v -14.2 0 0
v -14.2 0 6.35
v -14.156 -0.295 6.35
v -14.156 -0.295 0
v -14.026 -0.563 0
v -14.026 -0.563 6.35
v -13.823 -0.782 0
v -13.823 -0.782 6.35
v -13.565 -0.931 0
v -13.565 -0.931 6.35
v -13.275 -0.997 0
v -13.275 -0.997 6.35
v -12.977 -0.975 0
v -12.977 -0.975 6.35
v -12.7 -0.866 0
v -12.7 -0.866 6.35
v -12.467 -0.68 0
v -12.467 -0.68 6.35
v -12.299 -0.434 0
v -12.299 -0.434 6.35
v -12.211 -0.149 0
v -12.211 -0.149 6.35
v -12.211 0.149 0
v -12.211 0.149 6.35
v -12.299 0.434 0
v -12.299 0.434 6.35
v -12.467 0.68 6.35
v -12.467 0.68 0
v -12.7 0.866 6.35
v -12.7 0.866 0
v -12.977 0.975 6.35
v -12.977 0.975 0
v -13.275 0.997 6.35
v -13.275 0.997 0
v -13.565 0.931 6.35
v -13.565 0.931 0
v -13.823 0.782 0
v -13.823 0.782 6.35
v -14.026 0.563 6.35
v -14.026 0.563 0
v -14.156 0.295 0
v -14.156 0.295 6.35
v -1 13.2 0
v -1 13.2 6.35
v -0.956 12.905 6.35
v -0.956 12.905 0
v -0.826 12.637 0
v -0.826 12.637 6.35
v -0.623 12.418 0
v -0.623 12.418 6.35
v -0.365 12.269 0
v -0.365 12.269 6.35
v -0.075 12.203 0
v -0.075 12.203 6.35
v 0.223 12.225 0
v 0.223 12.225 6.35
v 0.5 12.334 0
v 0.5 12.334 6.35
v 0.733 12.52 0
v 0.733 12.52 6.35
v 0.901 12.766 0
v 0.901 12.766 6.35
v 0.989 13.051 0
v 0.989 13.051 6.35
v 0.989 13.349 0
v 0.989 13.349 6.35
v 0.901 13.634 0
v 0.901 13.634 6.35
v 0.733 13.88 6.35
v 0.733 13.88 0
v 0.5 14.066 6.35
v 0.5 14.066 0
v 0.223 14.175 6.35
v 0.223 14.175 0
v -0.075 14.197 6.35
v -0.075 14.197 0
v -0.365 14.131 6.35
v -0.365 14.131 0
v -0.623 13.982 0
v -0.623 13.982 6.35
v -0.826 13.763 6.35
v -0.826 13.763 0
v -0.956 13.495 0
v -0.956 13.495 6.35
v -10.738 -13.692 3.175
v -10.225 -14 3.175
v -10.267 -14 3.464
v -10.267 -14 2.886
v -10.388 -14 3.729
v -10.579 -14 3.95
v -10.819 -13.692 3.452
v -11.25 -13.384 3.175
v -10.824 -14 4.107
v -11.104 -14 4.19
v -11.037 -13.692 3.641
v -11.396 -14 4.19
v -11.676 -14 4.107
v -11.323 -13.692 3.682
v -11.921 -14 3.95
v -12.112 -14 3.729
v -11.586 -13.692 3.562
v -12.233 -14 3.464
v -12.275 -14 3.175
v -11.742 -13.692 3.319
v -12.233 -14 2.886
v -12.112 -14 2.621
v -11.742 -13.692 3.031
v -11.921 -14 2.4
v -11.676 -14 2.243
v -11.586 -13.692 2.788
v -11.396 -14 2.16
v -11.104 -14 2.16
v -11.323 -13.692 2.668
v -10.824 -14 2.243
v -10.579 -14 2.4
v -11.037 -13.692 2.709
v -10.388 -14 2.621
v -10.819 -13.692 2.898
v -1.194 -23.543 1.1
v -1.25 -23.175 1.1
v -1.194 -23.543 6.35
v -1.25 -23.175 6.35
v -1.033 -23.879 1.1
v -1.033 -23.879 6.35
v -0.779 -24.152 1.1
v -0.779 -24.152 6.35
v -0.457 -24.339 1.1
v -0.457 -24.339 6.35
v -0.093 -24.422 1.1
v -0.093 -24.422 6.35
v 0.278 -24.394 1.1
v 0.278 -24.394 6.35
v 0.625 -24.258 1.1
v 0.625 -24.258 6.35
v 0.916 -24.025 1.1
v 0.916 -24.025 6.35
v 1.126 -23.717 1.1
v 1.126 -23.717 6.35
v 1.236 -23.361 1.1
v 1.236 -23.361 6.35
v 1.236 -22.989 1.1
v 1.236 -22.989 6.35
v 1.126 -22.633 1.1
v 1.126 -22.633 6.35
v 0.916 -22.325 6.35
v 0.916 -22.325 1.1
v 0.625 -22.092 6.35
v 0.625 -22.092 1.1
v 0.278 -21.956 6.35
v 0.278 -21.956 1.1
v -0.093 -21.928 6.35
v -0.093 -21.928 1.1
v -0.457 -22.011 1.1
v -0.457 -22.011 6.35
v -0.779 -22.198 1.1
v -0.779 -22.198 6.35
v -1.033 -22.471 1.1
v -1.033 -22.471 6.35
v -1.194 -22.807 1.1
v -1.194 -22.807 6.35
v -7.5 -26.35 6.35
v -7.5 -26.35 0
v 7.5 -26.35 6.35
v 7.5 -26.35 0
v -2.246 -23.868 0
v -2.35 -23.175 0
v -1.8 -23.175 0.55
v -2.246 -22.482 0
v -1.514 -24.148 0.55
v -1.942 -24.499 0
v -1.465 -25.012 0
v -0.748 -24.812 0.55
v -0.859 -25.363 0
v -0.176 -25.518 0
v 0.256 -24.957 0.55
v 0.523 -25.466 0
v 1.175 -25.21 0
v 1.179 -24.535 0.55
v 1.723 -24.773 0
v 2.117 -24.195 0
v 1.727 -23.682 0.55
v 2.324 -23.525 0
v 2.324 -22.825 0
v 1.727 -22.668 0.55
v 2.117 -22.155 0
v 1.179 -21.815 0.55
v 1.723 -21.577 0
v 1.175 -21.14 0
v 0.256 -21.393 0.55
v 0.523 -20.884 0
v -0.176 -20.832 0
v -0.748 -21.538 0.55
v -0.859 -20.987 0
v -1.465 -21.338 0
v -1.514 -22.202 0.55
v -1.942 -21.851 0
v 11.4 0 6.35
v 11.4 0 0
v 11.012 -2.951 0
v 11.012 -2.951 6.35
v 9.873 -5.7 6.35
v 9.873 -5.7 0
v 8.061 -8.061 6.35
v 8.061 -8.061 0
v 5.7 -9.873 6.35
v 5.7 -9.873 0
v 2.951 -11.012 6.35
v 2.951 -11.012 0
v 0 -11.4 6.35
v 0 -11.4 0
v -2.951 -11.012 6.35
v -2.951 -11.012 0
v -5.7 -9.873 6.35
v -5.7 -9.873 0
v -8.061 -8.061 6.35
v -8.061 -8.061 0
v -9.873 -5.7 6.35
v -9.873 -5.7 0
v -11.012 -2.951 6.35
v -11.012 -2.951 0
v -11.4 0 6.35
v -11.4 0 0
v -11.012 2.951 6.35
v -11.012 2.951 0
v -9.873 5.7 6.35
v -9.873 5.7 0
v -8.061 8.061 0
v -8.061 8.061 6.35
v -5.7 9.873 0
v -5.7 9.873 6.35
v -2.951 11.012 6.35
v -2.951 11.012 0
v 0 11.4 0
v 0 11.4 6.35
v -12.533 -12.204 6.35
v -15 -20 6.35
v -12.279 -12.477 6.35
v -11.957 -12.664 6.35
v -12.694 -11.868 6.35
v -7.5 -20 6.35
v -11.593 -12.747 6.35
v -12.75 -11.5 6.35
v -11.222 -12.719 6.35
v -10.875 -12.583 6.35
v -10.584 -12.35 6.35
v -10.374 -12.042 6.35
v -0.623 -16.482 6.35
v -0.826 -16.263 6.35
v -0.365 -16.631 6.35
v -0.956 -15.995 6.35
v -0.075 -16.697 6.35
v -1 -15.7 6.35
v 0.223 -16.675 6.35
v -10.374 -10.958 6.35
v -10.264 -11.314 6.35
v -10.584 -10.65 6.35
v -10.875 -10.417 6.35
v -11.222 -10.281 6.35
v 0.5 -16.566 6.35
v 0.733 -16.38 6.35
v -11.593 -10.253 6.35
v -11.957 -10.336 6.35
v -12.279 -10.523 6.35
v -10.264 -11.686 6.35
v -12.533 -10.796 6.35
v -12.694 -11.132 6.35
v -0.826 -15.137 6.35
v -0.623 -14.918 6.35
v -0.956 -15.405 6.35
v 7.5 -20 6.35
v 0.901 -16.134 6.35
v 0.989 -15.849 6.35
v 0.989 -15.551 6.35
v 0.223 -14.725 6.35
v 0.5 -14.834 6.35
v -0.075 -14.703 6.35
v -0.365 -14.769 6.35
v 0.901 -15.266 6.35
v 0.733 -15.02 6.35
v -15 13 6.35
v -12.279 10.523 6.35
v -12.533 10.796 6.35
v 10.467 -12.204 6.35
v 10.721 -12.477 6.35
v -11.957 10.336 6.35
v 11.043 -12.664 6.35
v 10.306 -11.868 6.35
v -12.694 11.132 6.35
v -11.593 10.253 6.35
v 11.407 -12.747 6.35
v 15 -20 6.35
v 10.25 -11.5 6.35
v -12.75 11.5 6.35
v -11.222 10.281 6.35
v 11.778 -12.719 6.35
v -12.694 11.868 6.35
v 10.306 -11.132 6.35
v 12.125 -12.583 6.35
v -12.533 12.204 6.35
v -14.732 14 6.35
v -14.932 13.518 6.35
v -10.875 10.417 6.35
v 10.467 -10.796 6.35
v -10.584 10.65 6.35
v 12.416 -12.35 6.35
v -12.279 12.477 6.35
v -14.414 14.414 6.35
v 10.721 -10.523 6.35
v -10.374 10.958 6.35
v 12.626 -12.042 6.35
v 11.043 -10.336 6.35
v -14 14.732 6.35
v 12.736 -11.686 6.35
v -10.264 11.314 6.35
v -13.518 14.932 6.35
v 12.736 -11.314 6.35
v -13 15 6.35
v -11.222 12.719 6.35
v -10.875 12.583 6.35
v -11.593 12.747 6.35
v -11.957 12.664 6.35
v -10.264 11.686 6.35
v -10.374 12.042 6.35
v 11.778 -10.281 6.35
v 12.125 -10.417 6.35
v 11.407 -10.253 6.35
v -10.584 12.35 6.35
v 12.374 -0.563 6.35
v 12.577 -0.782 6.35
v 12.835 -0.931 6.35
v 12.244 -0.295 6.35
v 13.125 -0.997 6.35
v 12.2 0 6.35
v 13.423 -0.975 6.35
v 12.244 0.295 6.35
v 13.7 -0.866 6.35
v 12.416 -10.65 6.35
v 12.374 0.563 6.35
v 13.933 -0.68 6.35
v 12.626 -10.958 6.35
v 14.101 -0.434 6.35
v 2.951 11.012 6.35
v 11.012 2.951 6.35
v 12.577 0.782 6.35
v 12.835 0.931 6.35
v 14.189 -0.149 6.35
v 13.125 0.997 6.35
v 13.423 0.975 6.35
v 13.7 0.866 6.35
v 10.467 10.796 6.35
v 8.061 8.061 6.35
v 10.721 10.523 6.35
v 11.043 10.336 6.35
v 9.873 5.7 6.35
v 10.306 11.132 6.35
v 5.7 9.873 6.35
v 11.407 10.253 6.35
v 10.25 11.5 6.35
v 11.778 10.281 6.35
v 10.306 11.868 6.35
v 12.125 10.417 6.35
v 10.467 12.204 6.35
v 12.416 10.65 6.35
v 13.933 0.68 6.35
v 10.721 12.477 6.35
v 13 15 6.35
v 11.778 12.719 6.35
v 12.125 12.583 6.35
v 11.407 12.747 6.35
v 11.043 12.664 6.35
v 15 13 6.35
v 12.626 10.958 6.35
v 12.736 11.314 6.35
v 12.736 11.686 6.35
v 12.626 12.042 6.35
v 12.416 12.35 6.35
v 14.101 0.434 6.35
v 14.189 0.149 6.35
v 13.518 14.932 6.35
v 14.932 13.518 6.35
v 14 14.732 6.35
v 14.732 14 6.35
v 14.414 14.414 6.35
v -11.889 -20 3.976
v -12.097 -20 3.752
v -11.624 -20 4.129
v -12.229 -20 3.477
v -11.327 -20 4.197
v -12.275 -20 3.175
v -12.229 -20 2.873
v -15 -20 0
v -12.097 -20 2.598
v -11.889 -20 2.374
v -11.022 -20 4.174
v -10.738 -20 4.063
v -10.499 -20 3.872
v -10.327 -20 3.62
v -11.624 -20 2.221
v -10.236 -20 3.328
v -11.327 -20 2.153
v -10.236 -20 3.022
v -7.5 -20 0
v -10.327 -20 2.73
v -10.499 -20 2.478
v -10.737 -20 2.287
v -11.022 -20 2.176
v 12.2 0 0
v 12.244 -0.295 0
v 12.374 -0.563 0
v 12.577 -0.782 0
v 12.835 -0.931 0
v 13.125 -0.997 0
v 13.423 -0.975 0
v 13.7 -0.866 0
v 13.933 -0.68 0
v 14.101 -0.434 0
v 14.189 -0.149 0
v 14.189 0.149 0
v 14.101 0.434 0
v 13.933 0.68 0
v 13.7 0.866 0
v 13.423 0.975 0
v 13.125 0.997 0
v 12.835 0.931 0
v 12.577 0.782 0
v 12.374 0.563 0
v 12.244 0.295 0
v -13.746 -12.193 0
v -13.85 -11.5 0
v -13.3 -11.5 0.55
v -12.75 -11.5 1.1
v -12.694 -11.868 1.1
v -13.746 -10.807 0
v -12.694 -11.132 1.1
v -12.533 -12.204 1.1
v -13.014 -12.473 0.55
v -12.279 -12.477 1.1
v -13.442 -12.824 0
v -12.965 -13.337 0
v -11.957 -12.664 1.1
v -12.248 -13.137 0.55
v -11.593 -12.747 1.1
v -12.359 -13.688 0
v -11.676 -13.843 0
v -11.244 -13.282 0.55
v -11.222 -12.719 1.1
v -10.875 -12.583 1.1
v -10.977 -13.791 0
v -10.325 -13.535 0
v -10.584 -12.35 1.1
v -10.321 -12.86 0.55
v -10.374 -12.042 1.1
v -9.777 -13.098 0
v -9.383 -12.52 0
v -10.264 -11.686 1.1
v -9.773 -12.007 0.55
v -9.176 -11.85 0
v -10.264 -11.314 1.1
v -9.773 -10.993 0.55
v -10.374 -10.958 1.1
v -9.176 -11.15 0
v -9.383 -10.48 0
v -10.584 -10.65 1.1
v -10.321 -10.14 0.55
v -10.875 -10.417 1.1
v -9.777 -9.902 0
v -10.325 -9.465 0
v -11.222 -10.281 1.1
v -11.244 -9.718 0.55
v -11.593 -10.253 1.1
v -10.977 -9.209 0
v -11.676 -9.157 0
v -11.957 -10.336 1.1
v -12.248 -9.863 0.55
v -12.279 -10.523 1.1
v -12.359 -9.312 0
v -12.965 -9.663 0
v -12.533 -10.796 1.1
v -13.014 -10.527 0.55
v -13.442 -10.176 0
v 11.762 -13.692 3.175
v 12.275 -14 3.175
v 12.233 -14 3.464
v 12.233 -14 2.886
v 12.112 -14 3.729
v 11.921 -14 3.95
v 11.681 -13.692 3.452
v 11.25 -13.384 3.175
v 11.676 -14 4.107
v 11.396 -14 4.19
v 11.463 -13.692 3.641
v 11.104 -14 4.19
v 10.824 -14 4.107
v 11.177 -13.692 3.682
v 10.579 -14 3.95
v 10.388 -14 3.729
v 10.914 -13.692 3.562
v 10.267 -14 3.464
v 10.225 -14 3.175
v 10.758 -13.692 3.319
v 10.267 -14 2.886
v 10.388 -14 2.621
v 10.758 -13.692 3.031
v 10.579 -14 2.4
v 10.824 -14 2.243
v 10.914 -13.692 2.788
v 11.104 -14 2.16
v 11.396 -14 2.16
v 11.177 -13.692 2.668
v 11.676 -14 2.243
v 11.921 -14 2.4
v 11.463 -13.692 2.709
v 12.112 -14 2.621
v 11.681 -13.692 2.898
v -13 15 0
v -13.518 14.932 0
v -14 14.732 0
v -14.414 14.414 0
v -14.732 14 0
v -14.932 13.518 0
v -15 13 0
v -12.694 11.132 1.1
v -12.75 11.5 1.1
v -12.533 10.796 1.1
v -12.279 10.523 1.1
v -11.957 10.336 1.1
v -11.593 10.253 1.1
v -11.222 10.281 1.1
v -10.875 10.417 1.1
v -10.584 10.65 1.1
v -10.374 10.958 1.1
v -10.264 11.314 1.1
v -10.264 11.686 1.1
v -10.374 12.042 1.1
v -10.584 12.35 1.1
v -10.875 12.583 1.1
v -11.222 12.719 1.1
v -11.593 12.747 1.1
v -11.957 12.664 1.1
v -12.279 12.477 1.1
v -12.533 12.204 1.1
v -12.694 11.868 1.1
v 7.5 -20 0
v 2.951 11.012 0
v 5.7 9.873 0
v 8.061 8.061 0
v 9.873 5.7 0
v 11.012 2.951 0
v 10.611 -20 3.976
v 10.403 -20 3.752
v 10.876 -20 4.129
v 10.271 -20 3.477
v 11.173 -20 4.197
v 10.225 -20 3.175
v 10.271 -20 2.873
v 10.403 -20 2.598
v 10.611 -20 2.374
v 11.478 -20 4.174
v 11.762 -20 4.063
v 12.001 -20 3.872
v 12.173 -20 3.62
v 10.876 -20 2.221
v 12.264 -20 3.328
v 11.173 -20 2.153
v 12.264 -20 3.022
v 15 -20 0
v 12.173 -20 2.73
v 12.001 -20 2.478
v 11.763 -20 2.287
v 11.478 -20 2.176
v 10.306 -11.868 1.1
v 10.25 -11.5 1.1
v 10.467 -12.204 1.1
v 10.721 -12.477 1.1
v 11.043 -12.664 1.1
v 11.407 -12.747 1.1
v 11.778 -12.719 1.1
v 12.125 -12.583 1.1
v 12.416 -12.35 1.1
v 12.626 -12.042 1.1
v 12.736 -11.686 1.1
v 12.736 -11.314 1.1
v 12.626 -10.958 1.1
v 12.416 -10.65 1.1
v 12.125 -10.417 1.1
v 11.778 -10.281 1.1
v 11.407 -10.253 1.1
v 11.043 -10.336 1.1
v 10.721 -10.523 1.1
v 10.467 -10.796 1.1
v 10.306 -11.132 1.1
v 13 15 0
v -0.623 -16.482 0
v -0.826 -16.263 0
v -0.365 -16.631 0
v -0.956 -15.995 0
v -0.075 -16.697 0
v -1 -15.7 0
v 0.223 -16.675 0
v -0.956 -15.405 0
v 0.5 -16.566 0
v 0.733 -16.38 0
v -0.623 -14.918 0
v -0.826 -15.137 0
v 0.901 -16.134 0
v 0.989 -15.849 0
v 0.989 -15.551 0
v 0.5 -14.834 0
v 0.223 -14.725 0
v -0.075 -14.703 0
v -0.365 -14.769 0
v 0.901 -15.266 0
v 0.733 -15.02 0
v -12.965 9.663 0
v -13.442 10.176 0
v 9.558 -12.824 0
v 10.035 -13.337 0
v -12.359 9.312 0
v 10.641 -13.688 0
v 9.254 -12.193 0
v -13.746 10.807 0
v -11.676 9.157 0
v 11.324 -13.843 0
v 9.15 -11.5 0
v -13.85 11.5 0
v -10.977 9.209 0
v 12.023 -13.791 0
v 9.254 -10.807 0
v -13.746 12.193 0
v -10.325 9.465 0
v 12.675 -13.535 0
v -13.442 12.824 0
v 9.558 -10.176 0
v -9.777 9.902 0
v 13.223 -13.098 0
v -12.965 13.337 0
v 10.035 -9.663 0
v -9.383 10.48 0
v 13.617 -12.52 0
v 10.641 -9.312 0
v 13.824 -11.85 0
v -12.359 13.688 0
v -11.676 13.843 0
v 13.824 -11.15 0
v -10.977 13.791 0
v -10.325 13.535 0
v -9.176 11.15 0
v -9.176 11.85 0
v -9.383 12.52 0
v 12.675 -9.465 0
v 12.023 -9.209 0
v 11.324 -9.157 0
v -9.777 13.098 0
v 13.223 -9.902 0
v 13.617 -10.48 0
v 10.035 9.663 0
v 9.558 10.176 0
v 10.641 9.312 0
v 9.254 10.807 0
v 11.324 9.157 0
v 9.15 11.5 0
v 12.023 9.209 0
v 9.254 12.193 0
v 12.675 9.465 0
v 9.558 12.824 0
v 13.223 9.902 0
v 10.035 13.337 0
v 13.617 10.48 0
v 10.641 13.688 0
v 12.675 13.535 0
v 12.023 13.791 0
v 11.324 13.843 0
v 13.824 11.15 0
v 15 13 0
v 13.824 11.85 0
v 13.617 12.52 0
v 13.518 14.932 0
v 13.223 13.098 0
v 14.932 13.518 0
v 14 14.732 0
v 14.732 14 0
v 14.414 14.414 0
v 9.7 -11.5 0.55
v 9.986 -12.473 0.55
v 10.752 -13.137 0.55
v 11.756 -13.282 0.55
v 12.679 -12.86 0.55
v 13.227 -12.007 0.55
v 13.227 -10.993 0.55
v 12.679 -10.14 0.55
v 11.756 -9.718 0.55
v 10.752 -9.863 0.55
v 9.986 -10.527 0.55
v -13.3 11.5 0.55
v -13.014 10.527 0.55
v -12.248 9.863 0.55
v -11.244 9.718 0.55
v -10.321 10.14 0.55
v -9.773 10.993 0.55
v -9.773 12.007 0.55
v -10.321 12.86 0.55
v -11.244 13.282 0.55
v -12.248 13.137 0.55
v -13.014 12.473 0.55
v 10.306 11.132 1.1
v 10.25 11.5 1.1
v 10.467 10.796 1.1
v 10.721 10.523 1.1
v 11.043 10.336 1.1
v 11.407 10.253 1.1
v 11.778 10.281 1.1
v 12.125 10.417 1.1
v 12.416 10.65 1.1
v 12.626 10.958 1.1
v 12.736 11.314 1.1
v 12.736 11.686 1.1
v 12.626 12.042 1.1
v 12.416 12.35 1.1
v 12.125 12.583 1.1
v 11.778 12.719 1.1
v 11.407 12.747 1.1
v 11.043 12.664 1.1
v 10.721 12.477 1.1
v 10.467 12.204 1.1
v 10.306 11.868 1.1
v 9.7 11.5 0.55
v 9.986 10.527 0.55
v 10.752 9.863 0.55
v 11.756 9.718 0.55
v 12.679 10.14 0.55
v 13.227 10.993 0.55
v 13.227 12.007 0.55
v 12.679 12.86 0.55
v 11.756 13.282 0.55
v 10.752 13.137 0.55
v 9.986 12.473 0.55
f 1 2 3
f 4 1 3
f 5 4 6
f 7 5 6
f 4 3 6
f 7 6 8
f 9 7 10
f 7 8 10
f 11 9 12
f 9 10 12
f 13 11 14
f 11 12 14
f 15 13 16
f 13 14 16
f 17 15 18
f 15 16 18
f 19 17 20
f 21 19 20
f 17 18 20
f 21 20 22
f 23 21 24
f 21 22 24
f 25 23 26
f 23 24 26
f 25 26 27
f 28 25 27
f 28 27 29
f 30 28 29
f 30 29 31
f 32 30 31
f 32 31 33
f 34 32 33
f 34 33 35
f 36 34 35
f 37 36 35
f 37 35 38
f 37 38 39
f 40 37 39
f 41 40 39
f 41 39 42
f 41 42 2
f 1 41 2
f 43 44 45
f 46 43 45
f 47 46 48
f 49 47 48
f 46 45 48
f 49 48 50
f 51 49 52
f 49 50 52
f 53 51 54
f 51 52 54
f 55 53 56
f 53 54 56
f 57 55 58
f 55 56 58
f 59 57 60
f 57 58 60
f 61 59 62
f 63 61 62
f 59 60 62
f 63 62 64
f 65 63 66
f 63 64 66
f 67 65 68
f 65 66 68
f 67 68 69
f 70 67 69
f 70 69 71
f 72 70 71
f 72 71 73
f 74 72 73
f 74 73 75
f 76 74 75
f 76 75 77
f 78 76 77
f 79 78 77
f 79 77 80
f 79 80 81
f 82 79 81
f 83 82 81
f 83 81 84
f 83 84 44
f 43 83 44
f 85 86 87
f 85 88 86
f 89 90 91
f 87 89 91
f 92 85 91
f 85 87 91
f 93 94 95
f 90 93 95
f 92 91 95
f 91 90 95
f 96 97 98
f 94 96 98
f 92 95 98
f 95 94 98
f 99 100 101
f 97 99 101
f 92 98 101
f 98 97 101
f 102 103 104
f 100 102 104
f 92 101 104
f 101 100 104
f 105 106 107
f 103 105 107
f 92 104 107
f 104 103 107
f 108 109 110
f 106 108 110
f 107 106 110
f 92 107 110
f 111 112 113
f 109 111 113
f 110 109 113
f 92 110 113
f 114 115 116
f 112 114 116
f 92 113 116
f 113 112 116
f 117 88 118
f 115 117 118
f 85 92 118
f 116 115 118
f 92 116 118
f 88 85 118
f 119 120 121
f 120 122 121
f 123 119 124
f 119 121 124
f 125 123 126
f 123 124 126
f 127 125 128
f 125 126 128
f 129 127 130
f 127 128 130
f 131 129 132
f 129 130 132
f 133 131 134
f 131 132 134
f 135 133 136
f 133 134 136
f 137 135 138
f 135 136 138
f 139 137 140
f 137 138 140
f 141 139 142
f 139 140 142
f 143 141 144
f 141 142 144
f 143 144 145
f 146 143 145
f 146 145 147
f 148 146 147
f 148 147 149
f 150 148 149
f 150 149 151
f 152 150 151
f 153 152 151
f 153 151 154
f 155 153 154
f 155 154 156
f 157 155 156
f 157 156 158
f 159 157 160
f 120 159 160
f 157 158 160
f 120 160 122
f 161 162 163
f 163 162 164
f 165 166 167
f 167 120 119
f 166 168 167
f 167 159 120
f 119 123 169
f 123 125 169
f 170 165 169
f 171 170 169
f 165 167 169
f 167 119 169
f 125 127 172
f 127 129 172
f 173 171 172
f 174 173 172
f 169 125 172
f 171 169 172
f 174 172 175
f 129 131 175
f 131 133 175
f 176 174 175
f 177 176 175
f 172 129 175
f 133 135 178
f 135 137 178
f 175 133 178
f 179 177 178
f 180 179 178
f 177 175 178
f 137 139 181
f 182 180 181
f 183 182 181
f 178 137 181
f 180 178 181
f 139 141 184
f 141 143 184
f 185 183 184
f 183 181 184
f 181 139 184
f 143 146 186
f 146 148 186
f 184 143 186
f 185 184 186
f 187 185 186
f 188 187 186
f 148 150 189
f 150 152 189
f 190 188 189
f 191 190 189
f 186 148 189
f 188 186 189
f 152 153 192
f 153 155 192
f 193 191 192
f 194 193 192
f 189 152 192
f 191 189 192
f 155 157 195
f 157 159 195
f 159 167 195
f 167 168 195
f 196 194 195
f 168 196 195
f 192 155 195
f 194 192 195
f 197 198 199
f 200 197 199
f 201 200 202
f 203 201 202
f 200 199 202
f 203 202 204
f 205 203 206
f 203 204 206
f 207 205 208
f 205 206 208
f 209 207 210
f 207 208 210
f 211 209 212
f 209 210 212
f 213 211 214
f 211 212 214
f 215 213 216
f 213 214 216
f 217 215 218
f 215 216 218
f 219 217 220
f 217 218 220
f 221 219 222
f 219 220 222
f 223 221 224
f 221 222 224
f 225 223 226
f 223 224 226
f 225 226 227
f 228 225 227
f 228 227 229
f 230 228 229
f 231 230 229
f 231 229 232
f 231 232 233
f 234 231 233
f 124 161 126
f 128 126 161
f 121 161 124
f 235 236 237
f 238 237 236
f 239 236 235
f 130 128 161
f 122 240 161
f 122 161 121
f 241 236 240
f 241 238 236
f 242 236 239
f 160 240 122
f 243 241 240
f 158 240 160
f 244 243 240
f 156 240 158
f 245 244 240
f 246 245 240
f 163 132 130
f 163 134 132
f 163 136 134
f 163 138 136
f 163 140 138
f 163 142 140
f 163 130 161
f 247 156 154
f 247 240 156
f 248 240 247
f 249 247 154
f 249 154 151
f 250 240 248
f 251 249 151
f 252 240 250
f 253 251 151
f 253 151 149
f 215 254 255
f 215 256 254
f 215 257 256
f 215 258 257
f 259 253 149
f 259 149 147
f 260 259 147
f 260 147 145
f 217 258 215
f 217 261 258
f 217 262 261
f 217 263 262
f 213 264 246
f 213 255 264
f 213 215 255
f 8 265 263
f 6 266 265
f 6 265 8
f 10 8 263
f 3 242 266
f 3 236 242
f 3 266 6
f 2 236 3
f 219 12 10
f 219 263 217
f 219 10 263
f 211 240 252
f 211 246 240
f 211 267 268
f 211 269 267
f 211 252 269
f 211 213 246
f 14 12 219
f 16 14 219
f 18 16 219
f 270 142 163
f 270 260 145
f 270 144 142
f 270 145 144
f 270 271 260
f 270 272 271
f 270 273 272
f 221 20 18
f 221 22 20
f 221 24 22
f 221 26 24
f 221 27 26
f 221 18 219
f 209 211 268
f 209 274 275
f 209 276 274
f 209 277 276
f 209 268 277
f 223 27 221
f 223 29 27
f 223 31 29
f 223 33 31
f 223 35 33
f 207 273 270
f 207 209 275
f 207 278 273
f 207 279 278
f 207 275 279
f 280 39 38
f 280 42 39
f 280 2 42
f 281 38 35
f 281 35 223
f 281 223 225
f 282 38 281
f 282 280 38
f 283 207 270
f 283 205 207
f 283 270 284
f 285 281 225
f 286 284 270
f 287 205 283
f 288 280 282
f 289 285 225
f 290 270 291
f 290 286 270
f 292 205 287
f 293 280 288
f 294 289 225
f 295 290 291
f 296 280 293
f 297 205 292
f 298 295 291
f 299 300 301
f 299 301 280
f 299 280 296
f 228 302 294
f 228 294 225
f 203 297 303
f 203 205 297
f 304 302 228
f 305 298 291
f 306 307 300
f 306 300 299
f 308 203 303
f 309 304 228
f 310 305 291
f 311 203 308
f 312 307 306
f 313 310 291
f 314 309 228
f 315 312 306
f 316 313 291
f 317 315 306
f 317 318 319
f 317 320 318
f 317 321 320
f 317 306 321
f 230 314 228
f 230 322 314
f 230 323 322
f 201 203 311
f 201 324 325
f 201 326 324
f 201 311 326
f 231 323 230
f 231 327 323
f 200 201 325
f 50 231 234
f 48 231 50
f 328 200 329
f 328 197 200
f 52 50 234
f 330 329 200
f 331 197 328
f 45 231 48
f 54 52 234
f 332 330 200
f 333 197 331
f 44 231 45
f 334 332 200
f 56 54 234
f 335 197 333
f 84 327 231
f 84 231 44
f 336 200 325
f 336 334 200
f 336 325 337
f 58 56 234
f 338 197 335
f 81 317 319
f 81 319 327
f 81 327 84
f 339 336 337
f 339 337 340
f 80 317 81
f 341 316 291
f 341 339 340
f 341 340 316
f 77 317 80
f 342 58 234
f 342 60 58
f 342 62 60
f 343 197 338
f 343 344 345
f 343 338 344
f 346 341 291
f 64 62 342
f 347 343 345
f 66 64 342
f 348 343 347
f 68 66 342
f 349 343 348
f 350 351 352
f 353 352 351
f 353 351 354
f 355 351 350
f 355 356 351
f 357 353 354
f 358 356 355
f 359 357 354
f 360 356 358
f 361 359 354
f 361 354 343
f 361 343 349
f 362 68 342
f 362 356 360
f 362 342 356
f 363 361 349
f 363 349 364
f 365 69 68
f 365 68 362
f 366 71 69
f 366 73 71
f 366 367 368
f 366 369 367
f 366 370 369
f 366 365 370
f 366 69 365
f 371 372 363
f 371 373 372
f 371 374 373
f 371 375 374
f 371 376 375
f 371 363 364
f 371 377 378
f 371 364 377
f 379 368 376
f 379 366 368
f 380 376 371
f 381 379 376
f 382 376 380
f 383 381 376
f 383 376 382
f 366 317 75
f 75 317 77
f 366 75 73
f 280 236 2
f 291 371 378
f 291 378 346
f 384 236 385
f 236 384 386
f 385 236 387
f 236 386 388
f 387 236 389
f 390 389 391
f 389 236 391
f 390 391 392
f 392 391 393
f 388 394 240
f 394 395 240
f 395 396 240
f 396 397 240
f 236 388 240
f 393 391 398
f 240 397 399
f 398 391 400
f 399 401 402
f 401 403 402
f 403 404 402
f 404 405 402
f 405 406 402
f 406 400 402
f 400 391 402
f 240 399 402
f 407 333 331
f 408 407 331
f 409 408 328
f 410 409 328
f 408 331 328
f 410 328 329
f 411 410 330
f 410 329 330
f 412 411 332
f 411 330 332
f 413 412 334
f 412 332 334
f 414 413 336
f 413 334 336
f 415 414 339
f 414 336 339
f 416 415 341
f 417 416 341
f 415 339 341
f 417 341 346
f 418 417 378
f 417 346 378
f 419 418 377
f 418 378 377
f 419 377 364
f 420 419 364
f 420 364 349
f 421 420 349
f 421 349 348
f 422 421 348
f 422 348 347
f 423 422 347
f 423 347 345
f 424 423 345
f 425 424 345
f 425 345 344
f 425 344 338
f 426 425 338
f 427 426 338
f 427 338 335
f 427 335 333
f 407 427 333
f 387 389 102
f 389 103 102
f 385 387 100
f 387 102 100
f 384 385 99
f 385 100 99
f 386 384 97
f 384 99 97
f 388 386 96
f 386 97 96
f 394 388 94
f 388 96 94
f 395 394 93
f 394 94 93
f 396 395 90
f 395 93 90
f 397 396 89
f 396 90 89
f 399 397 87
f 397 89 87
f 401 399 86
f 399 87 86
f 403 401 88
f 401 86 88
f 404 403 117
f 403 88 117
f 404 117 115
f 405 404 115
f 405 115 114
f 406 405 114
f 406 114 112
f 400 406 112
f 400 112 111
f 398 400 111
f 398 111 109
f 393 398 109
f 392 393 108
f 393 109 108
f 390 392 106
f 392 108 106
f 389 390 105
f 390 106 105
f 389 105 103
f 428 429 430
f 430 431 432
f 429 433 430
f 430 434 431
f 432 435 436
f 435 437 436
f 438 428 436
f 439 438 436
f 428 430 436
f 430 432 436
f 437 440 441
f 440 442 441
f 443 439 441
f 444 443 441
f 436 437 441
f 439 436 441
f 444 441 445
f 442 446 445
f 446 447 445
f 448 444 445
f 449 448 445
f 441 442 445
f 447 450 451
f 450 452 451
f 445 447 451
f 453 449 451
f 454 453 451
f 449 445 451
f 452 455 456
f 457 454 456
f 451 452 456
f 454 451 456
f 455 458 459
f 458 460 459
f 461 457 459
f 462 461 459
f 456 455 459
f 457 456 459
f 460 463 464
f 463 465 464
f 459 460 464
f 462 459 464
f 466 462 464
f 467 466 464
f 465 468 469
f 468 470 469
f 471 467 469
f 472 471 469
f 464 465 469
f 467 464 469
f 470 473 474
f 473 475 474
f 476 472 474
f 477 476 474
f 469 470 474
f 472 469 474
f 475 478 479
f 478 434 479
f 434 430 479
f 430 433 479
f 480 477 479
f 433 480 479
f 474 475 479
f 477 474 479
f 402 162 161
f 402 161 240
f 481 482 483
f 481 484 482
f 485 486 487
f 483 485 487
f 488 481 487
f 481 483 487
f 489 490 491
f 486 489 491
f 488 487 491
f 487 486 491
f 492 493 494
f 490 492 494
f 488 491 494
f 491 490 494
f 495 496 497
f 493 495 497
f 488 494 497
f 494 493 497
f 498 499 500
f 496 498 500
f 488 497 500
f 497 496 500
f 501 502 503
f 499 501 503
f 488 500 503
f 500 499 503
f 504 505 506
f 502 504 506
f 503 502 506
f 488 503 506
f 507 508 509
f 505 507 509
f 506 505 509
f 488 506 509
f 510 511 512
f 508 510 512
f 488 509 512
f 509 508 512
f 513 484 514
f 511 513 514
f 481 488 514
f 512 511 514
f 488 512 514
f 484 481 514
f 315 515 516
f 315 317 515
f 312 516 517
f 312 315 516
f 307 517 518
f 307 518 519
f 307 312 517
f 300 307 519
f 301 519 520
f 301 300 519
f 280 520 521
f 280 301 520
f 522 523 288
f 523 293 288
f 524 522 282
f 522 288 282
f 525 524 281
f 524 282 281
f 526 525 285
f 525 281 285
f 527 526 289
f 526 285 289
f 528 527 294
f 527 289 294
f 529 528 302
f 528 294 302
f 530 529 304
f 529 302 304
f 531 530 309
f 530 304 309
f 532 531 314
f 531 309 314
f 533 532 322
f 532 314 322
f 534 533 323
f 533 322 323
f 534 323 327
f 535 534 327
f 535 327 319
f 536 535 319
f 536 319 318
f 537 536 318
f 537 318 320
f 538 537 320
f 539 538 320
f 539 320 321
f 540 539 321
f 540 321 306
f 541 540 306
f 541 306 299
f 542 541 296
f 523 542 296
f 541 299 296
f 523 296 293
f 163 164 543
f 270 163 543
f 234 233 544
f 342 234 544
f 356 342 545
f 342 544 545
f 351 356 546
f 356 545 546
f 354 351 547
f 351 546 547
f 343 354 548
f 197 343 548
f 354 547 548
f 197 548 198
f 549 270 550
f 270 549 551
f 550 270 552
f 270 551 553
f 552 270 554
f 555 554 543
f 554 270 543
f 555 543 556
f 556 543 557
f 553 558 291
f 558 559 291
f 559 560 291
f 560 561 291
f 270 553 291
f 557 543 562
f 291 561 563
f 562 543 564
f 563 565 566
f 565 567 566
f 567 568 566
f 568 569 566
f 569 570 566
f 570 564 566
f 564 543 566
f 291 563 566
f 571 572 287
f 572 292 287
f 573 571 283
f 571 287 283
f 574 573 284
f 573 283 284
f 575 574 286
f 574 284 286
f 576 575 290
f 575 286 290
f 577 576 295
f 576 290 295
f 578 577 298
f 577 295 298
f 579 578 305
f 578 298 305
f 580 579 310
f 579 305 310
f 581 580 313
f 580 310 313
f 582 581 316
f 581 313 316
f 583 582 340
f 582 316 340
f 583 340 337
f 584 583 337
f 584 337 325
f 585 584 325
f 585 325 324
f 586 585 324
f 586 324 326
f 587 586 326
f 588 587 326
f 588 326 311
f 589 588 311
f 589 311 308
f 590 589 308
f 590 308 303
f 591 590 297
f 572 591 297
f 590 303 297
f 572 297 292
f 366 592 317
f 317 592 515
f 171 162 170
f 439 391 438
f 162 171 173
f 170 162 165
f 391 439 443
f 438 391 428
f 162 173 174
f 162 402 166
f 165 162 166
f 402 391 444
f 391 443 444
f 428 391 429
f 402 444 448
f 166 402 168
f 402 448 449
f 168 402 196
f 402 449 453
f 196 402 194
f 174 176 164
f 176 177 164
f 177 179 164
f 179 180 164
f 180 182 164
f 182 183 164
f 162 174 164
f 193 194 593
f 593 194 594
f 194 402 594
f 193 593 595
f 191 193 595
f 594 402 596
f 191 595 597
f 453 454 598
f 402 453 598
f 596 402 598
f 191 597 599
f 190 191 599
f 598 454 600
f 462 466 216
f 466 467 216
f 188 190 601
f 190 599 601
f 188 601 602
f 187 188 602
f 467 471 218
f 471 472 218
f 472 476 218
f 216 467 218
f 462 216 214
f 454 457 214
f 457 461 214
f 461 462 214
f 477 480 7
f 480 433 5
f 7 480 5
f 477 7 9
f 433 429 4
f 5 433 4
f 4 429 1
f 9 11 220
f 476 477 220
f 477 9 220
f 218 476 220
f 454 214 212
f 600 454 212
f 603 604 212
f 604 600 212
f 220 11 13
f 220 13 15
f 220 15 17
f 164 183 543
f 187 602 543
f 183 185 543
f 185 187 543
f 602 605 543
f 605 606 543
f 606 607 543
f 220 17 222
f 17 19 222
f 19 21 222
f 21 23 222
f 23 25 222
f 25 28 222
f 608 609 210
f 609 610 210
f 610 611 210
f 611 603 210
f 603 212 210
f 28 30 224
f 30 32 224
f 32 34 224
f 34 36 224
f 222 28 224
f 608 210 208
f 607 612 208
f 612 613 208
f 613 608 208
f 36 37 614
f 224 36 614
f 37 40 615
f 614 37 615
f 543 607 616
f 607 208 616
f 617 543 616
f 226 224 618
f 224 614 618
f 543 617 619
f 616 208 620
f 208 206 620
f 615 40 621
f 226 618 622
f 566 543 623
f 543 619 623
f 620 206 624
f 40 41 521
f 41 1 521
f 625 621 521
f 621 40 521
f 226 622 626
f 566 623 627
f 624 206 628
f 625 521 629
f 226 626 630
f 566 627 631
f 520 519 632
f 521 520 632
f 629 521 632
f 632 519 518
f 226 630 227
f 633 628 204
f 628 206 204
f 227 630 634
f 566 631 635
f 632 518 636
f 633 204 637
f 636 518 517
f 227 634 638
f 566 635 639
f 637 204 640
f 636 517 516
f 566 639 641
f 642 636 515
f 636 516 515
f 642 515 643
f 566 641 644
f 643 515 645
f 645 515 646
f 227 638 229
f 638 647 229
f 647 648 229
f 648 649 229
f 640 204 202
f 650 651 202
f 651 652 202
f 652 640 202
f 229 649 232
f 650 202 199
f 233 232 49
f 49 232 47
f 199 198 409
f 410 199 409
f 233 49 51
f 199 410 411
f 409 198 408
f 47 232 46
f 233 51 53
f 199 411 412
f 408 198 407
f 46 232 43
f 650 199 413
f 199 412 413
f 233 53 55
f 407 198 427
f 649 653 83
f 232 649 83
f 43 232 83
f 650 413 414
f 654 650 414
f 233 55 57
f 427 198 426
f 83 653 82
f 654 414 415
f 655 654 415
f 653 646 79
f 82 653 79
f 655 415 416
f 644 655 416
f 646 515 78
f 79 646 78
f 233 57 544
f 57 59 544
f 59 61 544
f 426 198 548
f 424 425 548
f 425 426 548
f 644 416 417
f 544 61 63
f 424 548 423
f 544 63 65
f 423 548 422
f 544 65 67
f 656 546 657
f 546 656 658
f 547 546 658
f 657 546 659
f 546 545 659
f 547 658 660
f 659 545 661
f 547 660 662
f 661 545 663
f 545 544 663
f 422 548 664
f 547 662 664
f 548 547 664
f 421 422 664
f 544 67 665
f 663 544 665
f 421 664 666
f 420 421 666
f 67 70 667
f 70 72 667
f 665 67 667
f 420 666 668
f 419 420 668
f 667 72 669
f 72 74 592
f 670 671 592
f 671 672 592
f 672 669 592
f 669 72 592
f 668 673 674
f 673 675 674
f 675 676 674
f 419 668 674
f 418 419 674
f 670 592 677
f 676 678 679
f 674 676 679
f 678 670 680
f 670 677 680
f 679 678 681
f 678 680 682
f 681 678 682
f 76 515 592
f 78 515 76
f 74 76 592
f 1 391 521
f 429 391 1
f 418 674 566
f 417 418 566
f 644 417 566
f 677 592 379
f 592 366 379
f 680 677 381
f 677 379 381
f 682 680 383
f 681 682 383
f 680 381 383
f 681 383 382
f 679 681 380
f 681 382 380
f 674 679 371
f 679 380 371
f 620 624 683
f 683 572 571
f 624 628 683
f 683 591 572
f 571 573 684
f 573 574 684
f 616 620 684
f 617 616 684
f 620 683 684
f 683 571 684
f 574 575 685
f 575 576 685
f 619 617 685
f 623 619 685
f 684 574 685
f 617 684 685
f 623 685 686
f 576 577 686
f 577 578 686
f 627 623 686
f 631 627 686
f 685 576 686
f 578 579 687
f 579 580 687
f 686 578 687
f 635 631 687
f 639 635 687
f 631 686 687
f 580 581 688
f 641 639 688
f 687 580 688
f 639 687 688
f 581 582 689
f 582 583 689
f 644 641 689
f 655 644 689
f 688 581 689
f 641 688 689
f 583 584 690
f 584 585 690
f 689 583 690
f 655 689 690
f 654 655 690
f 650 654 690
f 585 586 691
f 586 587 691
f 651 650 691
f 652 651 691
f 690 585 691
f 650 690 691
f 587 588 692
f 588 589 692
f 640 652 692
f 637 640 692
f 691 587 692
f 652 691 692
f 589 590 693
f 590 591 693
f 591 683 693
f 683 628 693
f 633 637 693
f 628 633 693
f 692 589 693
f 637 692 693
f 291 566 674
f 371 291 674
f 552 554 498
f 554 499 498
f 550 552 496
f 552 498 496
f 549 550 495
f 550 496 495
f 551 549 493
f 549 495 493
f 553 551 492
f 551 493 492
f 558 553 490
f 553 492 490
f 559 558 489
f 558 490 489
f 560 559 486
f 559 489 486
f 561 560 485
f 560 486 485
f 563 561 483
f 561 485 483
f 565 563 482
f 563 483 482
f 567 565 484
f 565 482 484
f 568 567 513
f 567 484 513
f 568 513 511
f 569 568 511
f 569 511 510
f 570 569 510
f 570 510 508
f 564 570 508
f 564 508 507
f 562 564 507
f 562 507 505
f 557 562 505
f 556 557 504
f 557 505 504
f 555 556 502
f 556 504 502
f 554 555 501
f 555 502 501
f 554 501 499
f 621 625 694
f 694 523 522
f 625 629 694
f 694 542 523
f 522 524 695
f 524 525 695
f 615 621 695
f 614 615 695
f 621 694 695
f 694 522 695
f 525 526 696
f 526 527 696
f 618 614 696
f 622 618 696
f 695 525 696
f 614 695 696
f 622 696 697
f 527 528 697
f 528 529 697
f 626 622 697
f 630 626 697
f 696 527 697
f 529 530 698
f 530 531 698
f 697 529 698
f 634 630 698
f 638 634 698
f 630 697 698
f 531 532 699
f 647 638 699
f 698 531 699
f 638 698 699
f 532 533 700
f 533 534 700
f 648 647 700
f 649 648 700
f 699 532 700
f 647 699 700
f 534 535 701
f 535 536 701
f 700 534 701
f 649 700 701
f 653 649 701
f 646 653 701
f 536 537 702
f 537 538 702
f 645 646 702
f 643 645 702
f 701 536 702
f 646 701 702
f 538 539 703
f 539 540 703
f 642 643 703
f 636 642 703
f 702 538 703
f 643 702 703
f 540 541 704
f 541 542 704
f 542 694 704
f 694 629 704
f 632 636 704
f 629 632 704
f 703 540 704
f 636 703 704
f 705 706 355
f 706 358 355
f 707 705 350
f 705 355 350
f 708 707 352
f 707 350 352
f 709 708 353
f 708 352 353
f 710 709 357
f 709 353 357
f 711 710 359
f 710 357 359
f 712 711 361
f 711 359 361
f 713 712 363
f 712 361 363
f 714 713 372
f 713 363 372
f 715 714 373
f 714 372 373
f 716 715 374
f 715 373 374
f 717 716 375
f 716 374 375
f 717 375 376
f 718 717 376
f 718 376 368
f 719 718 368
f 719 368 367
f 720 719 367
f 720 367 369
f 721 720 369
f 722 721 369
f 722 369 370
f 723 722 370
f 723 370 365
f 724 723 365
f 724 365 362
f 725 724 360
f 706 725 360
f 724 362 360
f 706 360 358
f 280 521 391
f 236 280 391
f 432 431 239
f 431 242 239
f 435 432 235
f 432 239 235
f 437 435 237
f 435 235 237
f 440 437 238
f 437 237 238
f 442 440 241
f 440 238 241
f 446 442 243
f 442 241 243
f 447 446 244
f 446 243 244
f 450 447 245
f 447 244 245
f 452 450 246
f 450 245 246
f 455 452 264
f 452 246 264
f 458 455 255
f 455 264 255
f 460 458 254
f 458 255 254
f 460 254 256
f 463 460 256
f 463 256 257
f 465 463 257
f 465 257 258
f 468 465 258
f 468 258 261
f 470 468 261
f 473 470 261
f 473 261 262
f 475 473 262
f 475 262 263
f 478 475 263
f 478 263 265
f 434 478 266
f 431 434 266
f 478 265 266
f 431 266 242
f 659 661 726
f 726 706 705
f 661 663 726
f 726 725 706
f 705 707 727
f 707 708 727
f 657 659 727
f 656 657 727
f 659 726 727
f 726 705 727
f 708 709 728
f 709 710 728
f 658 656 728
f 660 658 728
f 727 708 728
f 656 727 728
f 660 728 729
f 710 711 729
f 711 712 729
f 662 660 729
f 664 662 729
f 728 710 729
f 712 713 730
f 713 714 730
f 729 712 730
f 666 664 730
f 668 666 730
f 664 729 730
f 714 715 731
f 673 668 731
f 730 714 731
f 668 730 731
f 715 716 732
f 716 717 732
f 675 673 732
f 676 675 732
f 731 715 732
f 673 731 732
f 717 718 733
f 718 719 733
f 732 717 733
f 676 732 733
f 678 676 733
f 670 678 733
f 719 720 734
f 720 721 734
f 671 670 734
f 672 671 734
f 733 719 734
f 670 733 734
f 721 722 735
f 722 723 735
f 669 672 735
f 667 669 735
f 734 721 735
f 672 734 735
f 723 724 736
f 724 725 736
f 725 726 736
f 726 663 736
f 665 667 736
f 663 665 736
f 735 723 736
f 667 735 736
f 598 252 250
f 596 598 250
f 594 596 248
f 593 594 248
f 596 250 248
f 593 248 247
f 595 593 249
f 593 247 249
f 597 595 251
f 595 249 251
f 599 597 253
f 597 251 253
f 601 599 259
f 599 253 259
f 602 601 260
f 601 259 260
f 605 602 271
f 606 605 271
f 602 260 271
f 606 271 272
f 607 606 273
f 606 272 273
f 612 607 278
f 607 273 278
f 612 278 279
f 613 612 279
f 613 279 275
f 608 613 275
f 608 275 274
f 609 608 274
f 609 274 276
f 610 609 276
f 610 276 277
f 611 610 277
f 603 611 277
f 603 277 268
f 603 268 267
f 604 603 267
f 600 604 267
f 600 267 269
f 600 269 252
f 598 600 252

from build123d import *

# Parameters (mm, degrees)
F0_W           = 15
F0_H           = 6.35
F1_DEPTH       = 6.35
F2_R           = 2
F5_D           = 2.05
F5_DEPTH       = 6
F5_TIP         = 0.6158821345
F5_ON_F3_D     = 2.05
F5_ON_F3_DEPTH = 6
F5_ON_F3_TIP   = 0.6158821345
F6_D           = 2.5
F6_CSINK_D     = 4.7
F6_CSINK_ANGLE = 90
F7_D           = 2
F7_DEPTH       = 8
F7_TIP         = 0.600860619


# Not quite as in the source:
# - a length typed as a fraction of an inch, garbled in the dataset ("3 / 203.2 mm" for 3/8 in), is restored


with BuildPart() as f1:
    # F0 (on Top) → F1 (new body)
    with BuildSketch(Plane.XY):
        Polygon((15, 15), (-15, 15), (-15, -20), (-7.5, -20), (7.5, -20), (15, -20), align=None)
        with BuildLine():
            ThreePointArc((0, 11.4), (8.0610173055, 8.0610173055), (11.4, 0))
            ThreePointArc((11.4, 0), (-8.0610173055, -8.0610173055), (0, 11.4))
        make_face(mode=Mode.SUBTRACT)
        with Locations((0, -23.175)):
            Rectangle(F0_W, F0_H)
    extrude(amount=F1_DEPTH)

    # F2
    f2_edges = [f1.edges().sort_by_distance(p)[0] for p in [
        (15, 15, 3.175),
        (-15, 15, 3.175),
    ]]
    fillet(f2_edges, radius=F2_R)

    # F5
    with Locations(Plane.XZ.offset(20)):
        with Locations((-11.25, 3.175)):
            Hole(F5_D / 2, depth=F5_DEPTH)
            with Locations((0, 0, -(F5_DEPTH + F5_TIP / 2))):  # 118° drill point
                Cone(0, F5_D / 2, F5_TIP, mode=Mode.SUBTRACT)

    # F5 on F3
    with Locations(Plane.XZ.offset(20)):
        with Locations((11.25, 3.175)):
            Hole(F5_ON_F3_D / 2, depth=F5_ON_F3_DEPTH)
            with Locations((0, 0, -(F5_ON_F3_DEPTH + F5_ON_F3_TIP / 2))):  # 118° drill point
                Cone(0, F5_ON_F3_D / 2, F5_ON_F3_TIP, mode=Mode.SUBTRACT)

    # F6 (through all)
    with Locations(Plane(origin=(0, 0, 0), x_dir=(1, 0, 0), z_dir=(0, 0, -1))):
        with Locations((-11.5, -11.5), (11.5, -11.5), (-11.5, 11.5), (11.5, 11.5), (0, 23.175)):
            CounterSinkHole(F6_D / 2, F6_CSINK_D / 2, counter_sink_angle=F6_CSINK_ANGLE)

    # F7
    with Locations(Plane(origin=(0, 0, 0), x_dir=(1, 0, 0), z_dir=(0, 0, -1))):
        with Locations((13.2, 0), (0, -13.2), (-13.2, 0), (0, 15.7)):
            Hole(F7_D / 2, depth=F7_DEPTH)
            with Locations((0, 0, -(F7_DEPTH + F7_TIP / 2))):  # 118° drill point
                Cone(0, F7_D / 2, F7_TIP, mode=Mode.SUBTRACT)


solid = f1.part
